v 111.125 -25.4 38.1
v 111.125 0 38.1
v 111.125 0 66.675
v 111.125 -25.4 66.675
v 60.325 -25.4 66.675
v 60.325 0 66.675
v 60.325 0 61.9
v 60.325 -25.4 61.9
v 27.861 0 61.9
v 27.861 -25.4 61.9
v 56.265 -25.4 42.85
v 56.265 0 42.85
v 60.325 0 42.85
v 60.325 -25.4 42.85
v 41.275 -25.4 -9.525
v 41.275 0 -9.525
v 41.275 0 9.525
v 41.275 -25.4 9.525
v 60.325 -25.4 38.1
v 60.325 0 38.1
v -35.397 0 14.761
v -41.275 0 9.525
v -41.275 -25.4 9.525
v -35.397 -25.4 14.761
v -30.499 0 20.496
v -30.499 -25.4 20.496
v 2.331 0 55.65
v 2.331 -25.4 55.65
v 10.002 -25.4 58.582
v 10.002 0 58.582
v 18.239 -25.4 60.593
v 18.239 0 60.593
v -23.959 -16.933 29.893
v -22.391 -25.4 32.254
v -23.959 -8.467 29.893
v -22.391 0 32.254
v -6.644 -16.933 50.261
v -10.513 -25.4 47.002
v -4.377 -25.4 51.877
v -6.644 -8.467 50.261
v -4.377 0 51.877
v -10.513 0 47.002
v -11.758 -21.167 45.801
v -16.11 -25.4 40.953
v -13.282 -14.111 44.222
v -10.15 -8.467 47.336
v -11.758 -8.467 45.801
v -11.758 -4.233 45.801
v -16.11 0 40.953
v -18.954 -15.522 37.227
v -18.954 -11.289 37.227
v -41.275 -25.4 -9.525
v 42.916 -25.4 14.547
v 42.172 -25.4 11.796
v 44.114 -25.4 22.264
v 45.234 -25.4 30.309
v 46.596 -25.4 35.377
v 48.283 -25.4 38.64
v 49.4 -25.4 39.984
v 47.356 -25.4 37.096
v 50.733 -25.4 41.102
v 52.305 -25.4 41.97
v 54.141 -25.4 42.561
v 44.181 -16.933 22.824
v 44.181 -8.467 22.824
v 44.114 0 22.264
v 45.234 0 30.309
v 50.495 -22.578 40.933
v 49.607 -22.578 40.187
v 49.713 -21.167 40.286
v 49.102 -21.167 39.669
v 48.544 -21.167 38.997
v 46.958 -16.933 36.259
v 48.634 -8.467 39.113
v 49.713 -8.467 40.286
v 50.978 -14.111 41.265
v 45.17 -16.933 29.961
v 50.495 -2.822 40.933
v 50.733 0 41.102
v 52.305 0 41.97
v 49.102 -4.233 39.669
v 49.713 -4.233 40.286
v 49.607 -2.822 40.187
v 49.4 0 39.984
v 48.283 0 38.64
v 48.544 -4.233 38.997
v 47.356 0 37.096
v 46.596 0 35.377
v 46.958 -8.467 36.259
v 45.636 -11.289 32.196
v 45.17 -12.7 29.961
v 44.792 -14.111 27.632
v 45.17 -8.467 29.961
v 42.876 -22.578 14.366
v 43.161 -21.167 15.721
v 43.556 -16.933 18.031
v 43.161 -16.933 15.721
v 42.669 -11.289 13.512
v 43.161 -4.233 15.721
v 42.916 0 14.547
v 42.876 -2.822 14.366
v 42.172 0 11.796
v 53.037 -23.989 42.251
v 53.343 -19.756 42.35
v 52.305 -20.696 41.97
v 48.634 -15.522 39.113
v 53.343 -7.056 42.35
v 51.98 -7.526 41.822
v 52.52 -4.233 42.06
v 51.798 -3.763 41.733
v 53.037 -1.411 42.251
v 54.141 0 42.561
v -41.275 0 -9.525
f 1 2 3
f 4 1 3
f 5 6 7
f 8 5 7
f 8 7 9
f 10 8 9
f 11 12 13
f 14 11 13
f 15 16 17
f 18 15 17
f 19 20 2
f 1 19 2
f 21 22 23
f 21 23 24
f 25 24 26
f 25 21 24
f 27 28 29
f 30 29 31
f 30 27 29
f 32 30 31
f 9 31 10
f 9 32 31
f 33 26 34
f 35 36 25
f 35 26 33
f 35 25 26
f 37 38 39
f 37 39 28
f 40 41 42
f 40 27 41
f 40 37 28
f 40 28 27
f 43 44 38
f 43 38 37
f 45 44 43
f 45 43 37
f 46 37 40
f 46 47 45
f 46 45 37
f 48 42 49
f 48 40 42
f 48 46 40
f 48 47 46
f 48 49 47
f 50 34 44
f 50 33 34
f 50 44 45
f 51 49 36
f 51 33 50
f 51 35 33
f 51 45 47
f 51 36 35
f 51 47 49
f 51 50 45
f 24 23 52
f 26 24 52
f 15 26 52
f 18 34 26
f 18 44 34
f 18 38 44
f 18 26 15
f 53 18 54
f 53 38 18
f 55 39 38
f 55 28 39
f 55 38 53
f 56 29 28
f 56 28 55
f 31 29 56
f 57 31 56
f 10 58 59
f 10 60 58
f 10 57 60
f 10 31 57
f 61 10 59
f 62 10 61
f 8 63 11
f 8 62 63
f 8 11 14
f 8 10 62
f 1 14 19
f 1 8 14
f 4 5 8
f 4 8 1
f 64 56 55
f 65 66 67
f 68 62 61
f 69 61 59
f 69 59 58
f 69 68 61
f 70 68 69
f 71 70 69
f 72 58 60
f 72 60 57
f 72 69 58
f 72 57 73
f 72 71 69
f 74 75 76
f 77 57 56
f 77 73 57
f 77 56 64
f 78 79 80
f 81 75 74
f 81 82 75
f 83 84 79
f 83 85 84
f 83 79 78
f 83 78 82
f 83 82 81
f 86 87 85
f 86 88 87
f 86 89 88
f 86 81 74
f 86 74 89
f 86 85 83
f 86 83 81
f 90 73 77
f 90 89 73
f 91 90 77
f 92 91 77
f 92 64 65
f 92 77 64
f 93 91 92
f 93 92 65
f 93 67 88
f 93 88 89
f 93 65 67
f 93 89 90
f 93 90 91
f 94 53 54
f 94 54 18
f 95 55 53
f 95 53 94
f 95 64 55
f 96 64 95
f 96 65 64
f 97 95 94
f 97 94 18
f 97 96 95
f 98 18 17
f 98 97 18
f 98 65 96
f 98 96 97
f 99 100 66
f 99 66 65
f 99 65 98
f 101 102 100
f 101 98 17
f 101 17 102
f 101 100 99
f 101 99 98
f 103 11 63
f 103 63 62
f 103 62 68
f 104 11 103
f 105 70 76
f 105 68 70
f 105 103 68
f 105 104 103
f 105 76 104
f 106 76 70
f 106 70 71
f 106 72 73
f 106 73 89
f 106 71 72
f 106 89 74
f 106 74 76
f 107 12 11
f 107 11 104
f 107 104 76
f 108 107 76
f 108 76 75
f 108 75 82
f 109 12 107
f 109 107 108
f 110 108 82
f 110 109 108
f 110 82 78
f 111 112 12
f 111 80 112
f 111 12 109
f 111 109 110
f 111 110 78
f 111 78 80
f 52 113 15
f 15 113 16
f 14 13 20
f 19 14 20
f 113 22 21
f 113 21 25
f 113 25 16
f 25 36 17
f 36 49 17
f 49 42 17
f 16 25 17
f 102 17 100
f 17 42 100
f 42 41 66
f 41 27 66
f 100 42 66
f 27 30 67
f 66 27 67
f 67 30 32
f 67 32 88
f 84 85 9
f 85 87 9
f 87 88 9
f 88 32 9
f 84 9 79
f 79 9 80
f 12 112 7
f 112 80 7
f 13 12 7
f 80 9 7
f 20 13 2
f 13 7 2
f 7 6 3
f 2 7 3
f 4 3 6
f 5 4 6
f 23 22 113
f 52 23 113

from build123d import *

# Parameters (mm, degrees)
F0_W     = 23.8088733172
F0_H     = 19.05
F1_DEPTH = 25.4


# Not quite as in the source:
# - ends of sketch curves that miss each other by under 0.0002 mm in the source are joined


with BuildPart() as f1:
    # F0 (on Front) → F1 (new body)
    with BuildSketch(Plane.XZ):
        Polygon((-41.275, -9.525), (41.275, -9.525), (41.275, 9.525), (22.225, 9.525), (-41.275, 9.525), align=None)
        with BuildLine():
            Line((22.225, 9.525), (41.275, 9.525))
            Line((41.275, 9.525), (41.275, 42.8498))
            Line((41.275, 42.8498), (56.2650781978, 42.8498))
            Line((56.2650781978, 42.8498), (60.325, 42.8498))
            Line((60.325, 42.8498), (60.325, 61.8998))
            Line((60.325, 61.8998), (27.8614319257, 61.8998))
            ThreePointArc((27.8614319257, 61.8998), (23.6637426323, 52.7961975559), (22.225, 42.8752))
            Line((22.225, 42.8752), (22.225, 9.525))
        make_face()
        with BuildLine():
            Line((41.275, 42.8498), (41.275, 9.525))
            add(Edge.make_bspline(
                [(56.2650781978, 42.8498), (41.47290193, 42.0072197884), (46.465802928, 20.4298387912), (41.275, 9.525)],
                knots=[0.7040277811, 0.7040277811, 0.7040277811, 0.7040277811, 36.9357748672, 36.9357748672, 36.9357748672, 36.9357748672], degree=3))
            Line((56.2650781978, 42.8498), (41.275, 42.8498))
        make_face()
        with BuildLine():
            add(Edge.make_bspline(
                [(-41.275, 9.525), (-18.2295226914, 26.9832666667), (-20.9687221795, 57.534776628), (27.8614319257, 61.8998)],
                knots=[0, 0, 0, 0, 86.7350326827, 86.7350326827, 86.7350326827, 86.7350326827], degree=3))
            Line((-41.275, 9.525), (22.225, 9.525))
            Line((22.225, 9.525), (22.225, 42.8752))
            ThreePointArc((22.225, 42.8752), (23.6637426323, 52.7961975559), (27.8614319257, 61.8998))
        make_face()
        Polygon((84.1338733172, 42.8498), (60.325, 42.8498), (60.325, 38.1), (111.125, 38.1), (111.125, 66.675), (60.325, 66.675), (60.325, 61.8998), (84.1338733172, 61.8998), align=None)
        with Locations((72.2294366586, 52.3748)):
            Rectangle(F0_W, F0_H)
    extrude(amount=F1_DEPTH)


solid = f1.part
